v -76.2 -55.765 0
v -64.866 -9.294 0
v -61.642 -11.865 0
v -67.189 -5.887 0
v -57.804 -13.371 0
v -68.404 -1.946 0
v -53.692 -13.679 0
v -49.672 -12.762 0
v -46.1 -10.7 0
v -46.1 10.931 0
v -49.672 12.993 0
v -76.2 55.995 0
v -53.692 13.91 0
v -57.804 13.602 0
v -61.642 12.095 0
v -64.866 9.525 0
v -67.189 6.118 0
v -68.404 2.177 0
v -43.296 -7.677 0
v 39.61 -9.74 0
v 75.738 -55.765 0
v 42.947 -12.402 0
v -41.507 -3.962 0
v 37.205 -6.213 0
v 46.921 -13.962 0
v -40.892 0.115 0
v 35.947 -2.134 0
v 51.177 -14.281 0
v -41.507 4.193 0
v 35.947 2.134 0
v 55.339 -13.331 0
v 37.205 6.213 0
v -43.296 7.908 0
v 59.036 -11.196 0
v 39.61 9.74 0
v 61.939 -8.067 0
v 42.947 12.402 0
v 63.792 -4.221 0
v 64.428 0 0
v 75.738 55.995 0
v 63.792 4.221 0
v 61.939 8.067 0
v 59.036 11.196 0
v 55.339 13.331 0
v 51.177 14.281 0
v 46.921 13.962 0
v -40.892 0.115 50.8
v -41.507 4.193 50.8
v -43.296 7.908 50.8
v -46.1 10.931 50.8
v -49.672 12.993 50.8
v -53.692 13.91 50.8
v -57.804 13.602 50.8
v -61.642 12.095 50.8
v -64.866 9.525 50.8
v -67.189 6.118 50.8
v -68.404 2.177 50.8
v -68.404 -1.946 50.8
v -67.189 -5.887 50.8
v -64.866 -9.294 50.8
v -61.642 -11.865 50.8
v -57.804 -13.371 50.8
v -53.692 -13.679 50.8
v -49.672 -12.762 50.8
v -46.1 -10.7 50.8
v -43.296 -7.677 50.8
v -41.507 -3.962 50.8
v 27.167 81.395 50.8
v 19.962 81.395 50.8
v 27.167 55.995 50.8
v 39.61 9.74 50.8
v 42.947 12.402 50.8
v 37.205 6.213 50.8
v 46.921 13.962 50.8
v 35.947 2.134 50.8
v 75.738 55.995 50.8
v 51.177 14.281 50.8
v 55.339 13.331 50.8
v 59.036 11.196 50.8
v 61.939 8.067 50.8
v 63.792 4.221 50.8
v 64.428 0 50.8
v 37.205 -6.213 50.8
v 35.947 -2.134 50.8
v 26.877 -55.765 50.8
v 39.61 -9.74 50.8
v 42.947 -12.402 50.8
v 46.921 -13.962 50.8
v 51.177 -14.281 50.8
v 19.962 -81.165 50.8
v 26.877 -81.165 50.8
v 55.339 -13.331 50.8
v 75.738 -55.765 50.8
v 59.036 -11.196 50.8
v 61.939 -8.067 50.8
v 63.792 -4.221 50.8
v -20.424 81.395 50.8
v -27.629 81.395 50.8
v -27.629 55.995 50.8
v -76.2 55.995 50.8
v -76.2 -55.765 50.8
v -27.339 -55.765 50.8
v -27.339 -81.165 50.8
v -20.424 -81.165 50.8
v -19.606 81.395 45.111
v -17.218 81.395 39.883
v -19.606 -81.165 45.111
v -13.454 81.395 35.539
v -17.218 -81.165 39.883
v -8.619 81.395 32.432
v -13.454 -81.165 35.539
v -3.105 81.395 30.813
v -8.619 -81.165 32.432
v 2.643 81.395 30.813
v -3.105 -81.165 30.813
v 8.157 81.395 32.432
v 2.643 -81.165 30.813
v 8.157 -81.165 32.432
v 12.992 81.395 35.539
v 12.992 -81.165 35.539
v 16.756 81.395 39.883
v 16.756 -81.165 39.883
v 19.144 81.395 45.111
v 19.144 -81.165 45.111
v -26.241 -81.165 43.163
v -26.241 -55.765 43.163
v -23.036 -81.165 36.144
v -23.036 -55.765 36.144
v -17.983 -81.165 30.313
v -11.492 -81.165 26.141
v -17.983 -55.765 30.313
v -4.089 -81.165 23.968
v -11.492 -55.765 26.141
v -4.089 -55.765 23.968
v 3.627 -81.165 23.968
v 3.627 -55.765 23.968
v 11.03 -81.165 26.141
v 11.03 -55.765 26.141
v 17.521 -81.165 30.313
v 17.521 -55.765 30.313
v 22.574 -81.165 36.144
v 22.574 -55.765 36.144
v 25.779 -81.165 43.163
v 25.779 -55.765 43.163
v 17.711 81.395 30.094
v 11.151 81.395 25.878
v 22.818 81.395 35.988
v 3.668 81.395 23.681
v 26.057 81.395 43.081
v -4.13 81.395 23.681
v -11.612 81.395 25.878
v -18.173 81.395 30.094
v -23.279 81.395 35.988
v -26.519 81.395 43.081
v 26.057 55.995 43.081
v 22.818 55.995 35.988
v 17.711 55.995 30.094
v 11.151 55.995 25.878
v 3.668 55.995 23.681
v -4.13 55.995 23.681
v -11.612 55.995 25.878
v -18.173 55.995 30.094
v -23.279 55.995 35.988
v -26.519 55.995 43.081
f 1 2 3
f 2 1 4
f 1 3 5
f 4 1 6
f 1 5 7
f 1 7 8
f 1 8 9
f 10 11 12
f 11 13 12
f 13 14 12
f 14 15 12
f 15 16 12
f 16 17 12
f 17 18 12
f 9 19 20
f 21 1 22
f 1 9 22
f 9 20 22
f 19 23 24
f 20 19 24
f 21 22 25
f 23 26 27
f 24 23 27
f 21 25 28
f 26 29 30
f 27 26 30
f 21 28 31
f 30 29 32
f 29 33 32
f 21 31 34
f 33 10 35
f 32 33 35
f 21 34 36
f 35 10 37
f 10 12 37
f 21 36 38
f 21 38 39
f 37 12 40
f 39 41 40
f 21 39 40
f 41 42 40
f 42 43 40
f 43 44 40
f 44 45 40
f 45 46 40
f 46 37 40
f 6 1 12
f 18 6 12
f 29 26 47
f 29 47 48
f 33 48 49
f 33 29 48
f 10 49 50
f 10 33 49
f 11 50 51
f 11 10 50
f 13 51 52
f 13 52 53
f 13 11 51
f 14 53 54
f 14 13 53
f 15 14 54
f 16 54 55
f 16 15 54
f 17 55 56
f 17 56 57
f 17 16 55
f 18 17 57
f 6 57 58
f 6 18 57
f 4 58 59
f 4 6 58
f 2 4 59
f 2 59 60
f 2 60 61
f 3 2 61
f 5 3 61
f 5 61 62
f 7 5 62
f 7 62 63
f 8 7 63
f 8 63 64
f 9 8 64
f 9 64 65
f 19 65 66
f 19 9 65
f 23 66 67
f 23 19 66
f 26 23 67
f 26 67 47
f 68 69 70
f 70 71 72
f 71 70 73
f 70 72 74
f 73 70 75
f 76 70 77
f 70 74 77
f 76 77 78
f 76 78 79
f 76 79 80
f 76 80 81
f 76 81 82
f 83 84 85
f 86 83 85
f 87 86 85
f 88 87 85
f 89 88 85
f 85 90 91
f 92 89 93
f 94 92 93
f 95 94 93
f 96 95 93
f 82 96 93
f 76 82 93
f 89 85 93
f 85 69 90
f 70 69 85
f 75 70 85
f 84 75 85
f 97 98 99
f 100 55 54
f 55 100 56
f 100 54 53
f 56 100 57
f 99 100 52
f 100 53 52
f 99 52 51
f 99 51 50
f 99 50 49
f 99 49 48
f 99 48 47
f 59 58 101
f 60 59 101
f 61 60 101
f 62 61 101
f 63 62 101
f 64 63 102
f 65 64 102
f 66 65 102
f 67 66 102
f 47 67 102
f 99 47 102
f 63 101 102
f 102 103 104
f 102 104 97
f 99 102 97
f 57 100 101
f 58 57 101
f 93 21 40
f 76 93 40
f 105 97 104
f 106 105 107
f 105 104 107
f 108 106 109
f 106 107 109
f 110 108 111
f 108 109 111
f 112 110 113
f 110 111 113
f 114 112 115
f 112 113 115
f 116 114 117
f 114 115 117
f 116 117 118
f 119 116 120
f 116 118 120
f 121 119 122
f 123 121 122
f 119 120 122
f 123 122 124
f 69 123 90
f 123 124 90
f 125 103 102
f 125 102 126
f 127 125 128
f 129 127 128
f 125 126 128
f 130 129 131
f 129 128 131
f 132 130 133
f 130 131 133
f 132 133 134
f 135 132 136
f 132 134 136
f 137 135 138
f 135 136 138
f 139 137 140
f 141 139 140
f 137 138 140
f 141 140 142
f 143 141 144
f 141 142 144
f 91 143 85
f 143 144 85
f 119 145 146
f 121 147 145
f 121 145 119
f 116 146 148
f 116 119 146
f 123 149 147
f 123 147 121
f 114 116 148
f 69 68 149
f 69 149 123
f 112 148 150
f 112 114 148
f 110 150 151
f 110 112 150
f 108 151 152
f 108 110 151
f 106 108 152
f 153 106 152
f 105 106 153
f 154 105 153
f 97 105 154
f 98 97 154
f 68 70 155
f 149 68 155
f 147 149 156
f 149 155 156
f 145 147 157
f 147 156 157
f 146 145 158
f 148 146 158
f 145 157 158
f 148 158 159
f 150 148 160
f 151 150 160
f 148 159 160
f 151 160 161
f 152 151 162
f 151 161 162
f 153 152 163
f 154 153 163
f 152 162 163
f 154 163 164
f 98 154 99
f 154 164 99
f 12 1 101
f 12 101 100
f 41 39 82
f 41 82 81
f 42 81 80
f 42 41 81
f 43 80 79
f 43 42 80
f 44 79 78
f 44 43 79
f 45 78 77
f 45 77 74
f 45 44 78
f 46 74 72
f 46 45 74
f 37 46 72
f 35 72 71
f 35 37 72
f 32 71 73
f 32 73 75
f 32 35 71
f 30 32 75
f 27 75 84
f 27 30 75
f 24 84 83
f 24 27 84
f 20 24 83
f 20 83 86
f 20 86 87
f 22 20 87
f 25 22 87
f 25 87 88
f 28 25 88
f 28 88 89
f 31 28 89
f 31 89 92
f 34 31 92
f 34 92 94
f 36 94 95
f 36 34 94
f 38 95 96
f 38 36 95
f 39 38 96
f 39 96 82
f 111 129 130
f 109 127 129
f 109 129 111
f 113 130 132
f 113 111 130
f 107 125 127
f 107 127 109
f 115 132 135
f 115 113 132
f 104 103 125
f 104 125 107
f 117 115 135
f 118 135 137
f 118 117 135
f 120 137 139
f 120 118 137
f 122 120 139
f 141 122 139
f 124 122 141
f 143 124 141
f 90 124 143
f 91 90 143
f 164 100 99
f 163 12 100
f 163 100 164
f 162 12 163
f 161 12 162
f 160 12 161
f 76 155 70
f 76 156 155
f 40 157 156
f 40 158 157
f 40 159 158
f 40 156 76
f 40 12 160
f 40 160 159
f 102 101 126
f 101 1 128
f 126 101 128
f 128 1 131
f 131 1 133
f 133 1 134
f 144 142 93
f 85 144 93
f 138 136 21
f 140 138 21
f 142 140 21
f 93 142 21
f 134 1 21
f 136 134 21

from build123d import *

# Parameters (mm, degrees)
F0_W     = 151.9381850958
F0_H     = 111.7599979043
F0_R     = 13.8333647365
F0_R_2   = 14.3205526474
F1_DEPTH = 50.8
F3_DEPTH = 25.4
F4_DEPTH = 127
F6_DEPTH = 25.4


with BuildPart() as f1:
    # F0 (on Top) → F1 (new body)
    with BuildSketch(Plane.XY):
        with Locations((-0.2309083939, 0.1154541969)):
            Rectangle(F0_W, F0_H)
        with Locations((-54.7254569829, 0.1154541969)):
            Circle(F0_R, mode=Mode.SUBTRACT)
        with Locations((50.1072742045, 0)):
            Circle(F0_R_2, mode=Mode.SUBTRACT)
    extrude(amount=F1_DEPTH)

    # F2 (on face) → F3 (join)
    with BuildSketch(Plane.XZ.offset(55.7645447552)):
        with BuildLine():
            ThreePointArc((-27.3391341012, 50.8), (-0.2309083939, 23.6917742927), (26.8773173135, 50.8))
            Line((26.8773173135, 50.8), (19.9617576881, 50.8))
            ThreePointArc((19.9617576881, 50.8), (-0.2309083939, 30.6073339181), (-20.4235744758, 50.8))
            Line((-20.4235744758, 50.8), (-27.3391341012, 50.8))
        make_face()
    extrude(amount=F3_DEPTH)

    # F4 (cut): a face of the model
    f4_faces = [f1.faces().sort_by_distance(p)[0] for p in [
        (-0.2309083939, -55.7645447552, 42.2299663436),
    ]]
    extrude(f4_faces, amount=-F4_DEPTH, mode=Mode.SUBTRACT)

    # F5 (on face) → F6 (join)
    with BuildSketch(Plane(origin=(0, 55.9954531491, 0), x_dir=(-1, 0, 0), z_dir=(0, 1, 0))):
        with BuildLine():
            ThreePointArc((-27.1668712907, 50.8), (0.2309083939, 23.4022203155), (27.6286880784, 50.8))
            Line((27.6286880784, 50.8), (20.4235744758, 50.8))
            ThreePointArc((20.4235744758, 50.8), (0.2309083939, 30.6073339181), (-19.9617576881, 50.8))
            Line((-19.9617576881, 50.8), (-27.1668712907, 50.8))
        make_face()
    extrude(amount=F6_DEPTH)


solid = f1.part
